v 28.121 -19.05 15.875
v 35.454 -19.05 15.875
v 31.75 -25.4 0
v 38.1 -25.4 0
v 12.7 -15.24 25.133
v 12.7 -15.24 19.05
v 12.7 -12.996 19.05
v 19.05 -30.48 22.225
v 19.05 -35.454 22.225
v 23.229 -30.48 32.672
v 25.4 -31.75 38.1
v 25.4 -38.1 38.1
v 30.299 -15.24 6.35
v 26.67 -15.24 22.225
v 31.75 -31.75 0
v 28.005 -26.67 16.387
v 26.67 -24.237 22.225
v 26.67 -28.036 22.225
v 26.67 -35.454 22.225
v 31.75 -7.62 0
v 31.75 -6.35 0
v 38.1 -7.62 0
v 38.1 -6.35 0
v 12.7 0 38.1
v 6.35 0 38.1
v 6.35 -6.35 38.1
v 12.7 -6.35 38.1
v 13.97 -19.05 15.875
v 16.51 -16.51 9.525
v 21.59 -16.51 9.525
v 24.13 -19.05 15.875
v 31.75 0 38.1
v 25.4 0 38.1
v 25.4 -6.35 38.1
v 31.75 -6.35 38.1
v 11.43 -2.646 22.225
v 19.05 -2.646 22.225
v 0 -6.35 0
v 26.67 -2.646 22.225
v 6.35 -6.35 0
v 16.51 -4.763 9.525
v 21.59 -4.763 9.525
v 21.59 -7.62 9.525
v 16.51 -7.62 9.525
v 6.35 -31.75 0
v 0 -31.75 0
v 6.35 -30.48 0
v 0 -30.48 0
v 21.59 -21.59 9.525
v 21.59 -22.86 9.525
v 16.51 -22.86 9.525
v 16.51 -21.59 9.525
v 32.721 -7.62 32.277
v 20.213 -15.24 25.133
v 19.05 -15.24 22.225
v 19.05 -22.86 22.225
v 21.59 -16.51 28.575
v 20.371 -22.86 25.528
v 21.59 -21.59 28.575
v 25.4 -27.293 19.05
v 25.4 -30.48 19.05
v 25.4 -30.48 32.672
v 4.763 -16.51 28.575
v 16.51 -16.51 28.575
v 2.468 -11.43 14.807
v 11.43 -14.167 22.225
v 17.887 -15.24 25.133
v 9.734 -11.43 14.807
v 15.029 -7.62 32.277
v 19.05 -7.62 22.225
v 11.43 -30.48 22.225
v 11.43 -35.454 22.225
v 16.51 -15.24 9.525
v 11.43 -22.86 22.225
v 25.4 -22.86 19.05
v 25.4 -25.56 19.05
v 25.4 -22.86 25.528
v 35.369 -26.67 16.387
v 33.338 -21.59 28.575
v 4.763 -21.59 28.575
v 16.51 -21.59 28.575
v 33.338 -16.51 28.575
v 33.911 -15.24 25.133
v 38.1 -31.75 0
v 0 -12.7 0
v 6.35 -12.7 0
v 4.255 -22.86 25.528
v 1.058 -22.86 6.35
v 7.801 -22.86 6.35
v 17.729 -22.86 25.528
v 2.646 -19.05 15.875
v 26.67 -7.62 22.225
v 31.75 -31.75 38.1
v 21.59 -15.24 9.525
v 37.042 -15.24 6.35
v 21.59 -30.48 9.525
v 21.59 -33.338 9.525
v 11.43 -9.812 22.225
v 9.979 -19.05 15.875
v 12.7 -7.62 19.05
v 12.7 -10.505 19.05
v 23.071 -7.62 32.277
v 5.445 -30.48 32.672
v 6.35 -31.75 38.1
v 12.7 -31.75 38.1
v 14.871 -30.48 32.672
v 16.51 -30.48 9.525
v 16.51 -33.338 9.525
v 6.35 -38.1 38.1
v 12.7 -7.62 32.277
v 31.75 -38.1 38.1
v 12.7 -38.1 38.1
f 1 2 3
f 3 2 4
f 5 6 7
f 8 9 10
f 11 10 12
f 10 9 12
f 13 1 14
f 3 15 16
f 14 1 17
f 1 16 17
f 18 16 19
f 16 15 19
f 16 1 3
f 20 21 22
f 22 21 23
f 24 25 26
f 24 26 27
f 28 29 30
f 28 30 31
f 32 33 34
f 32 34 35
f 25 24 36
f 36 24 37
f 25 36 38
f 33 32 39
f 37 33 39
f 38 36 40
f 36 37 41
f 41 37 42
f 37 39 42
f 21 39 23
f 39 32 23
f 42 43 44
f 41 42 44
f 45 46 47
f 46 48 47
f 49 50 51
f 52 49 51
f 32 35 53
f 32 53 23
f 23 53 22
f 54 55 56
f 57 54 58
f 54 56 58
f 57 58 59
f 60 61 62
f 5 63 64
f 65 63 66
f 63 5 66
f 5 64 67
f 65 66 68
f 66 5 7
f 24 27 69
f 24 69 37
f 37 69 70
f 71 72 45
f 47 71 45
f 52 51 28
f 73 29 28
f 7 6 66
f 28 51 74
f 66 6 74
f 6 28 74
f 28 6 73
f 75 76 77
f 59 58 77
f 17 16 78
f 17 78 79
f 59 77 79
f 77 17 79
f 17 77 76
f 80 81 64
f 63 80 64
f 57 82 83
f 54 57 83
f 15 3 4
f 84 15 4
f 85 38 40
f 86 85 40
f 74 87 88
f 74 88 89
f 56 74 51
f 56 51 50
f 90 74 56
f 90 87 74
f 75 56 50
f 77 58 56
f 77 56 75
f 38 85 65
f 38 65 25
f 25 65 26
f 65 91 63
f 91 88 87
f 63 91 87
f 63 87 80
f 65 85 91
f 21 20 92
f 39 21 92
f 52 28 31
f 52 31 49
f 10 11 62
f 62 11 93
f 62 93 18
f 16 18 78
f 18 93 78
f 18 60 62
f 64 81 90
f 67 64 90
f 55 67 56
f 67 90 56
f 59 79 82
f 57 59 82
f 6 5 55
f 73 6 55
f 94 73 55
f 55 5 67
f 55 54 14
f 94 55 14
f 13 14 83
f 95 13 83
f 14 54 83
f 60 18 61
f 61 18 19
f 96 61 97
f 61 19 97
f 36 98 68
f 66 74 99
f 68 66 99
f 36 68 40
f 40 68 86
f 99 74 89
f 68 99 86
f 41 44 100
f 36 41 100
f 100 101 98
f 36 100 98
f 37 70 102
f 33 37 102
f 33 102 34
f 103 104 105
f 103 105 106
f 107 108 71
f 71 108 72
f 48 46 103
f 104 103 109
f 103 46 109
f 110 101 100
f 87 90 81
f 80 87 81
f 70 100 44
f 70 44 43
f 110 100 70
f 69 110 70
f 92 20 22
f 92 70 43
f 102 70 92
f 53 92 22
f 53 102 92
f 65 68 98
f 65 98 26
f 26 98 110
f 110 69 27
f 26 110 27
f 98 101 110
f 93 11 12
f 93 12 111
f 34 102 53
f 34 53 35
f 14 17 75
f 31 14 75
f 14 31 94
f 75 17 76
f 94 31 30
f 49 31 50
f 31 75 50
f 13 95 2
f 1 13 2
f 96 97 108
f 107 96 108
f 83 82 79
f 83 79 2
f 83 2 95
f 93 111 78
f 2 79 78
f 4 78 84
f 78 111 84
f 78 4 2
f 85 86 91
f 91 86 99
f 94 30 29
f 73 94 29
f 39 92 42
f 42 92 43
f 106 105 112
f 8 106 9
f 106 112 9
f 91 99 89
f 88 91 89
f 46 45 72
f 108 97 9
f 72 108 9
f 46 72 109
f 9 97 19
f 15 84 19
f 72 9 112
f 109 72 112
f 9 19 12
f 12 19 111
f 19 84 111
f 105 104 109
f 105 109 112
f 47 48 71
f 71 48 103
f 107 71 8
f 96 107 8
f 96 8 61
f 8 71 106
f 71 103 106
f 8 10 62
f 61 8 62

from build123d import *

# Parameters (mm, degrees)
F0_W      = 38.1
F0_H      = 38.1
F1_DEPTH  = 38.1
F6_DEPTH  = 38.1
F8_DEPTH  = 38.1
F9_W      = 25.4
F9_H      = 7.62
F9_H_2    = 7.619996
F10_DEPTH = 38.1


with BuildPart() as f1:
    # F0 (on Front) → F1 (new body)
    with BuildSketch(Plane.XZ):
        with Locations((19.05, 19.05)):
            Rectangle(F0_W, F0_H)
    extrude(amount=F1_DEPTH)

    # F5 (on offset) → F6 (cut)
    with BuildSketch(Plane.YZ.offset(38.1)):
        Polygon((-11.43, 14.807015), (-6.35, 38.1), (-31.75, 38.1), (-26.67, 16.386524), (-21.59, 28.575), (-16.51, 28.575), align=None)
        Polygon((-25.4, 0), (-12.7, 0), (-19.05, 15.875), align=None)
        Polygon((-38.1, 0), (-31.75, 0), (-38.1, 38.1), align=None)
        Polygon((-6.35, 0), (0, 0), (0, 38.1), align=None)
    extrude(amount=-F6_DEPTH, mode=Mode.SUBTRACT)

    # F7 (on offset) → F8 (cut)
    with BuildSketch(Plane.XZ.offset(38.1)):
        Polygon((11.43, 22.225), (6.35, 0), (31.75, 0), (26.67, 22.225), (21.59, 9.525), (16.51, 9.525), align=None)
        Polygon((0, 38.1), (0, 0), (6.35, 38.1), align=None)
        Polygon((25.4, 38.1), (12.7, 38.1), (19.05, 22.225), align=None)
        Polygon((31.75, 38.1), (38.100006, 0), (38.100006, 38.1), align=None)
    extrude(amount=-F8_DEPTH, mode=Mode.SUBTRACT)

    # F9 (on offset) → F10 (cut)
    with BuildSketch(Plane.XY.offset(38.1)):
        with Locations((25.4, -11.43)):
            Rectangle(F9_W, F9_H)
        with Locations((12.7, -26.669998)):
            Rectangle(F9_W, F9_H_2)
    extrude(amount=-F10_DEPTH, mode=Mode.SUBTRACT)


solid = f1.part
